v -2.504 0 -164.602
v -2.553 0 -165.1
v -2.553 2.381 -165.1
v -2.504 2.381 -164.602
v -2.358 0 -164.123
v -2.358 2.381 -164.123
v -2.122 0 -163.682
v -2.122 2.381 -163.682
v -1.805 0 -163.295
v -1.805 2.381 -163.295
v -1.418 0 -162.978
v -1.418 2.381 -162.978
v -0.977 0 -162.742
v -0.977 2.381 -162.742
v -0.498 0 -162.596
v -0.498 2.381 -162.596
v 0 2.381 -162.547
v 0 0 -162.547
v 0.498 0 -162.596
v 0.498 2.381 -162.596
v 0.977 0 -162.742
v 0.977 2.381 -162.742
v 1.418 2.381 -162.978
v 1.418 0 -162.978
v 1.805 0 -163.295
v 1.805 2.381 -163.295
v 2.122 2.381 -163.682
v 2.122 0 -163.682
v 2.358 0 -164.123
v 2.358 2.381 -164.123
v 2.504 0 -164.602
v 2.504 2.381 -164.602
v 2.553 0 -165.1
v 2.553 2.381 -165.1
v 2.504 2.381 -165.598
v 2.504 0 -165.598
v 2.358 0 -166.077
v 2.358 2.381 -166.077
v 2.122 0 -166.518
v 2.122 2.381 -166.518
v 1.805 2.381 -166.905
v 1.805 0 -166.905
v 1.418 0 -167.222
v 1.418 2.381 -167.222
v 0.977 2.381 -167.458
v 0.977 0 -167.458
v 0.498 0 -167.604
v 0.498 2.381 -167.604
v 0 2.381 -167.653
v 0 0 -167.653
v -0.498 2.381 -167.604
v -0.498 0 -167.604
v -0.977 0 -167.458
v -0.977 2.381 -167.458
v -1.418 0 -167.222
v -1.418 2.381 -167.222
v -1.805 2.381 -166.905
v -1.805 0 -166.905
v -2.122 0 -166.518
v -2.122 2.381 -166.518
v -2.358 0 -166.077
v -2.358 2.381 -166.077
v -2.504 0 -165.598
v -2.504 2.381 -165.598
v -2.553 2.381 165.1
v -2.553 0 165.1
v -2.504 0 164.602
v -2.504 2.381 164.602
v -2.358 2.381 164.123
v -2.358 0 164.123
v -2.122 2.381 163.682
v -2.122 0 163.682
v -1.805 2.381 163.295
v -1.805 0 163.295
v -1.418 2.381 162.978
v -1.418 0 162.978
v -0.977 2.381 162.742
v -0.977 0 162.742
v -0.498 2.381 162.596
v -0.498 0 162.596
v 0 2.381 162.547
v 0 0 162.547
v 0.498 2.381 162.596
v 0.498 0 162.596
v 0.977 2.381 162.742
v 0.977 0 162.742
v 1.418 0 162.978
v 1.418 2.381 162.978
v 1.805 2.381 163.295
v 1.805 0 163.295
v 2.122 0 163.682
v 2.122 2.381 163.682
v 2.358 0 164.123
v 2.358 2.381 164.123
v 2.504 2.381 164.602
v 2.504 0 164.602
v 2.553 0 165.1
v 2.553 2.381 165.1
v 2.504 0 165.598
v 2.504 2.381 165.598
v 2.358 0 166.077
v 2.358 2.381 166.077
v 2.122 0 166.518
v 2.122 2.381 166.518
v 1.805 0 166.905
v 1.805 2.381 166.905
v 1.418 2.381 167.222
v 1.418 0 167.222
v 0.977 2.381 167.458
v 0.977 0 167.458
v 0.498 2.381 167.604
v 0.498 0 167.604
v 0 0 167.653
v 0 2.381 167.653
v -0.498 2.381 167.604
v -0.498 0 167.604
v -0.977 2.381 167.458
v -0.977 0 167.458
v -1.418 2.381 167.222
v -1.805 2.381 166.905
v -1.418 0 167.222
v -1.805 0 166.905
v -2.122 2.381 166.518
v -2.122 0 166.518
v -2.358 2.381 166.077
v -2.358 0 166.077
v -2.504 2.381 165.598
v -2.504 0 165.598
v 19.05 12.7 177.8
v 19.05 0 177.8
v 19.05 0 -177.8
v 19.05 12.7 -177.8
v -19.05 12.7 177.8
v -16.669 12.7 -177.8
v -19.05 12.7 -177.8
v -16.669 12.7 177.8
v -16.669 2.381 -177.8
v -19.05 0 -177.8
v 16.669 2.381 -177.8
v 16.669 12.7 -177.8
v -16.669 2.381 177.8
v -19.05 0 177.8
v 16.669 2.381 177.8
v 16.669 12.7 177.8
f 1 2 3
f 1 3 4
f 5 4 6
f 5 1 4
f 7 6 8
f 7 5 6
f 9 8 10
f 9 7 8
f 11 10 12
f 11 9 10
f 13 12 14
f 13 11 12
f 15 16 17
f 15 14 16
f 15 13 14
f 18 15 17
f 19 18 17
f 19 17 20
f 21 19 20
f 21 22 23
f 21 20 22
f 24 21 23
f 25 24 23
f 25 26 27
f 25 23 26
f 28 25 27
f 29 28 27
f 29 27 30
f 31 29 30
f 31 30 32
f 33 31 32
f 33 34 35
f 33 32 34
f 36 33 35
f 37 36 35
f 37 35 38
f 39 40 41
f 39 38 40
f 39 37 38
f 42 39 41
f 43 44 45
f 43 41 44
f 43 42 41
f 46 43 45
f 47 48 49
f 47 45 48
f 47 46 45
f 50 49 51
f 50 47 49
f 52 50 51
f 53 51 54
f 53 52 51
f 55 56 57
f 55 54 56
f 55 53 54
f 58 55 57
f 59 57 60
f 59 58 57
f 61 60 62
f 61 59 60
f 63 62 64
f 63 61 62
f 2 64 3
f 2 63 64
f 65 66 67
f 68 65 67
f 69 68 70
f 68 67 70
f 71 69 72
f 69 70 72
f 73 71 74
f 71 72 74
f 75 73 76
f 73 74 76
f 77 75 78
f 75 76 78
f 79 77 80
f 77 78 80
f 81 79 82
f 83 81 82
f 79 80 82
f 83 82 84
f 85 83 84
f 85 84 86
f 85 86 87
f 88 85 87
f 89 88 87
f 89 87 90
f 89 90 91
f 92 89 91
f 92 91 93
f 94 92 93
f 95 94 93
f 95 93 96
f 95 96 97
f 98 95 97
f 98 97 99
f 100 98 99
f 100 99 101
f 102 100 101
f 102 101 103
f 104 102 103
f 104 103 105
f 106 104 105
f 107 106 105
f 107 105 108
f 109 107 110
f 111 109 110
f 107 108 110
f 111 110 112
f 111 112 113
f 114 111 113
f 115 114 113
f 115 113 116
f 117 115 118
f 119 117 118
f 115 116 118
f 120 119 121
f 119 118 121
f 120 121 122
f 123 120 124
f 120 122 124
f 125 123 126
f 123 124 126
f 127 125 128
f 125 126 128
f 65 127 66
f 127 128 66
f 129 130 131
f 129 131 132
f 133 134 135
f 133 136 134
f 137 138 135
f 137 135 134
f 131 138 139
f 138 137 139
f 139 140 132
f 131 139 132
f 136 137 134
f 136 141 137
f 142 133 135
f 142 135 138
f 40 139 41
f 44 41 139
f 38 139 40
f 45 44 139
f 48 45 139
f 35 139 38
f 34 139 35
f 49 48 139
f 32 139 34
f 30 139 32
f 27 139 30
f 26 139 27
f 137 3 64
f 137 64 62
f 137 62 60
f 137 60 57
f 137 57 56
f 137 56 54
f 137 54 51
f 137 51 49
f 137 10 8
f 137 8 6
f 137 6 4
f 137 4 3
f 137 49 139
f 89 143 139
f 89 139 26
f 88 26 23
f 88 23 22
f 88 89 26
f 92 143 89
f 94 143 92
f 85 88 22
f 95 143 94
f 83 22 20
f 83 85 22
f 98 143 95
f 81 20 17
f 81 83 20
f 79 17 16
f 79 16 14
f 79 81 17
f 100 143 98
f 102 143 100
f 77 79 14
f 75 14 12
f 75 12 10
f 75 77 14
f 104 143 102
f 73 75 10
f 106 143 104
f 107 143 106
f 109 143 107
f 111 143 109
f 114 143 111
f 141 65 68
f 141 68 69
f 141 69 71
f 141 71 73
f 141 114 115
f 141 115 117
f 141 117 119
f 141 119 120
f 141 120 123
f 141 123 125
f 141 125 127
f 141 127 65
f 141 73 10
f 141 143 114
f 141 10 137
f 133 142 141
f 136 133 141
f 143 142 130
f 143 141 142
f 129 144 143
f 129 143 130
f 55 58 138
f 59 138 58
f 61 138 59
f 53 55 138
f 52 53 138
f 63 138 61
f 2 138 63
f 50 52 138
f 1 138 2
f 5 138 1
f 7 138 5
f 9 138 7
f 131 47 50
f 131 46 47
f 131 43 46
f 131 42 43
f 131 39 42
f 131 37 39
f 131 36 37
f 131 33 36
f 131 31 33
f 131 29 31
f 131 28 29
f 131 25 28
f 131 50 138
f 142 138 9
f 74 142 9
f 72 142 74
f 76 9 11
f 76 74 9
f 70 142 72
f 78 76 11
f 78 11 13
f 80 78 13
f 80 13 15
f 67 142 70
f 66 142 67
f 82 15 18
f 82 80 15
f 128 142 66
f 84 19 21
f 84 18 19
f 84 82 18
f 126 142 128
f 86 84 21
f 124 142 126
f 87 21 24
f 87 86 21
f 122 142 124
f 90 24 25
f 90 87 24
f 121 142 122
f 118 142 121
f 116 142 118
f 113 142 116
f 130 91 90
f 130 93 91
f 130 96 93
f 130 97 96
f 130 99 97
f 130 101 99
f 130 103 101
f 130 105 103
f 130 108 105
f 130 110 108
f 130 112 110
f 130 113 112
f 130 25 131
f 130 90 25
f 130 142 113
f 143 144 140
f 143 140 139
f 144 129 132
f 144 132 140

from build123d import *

# Parameters (mm, degrees)
BOSS_EXTRUDE1_DEPTH     = 177.8
F_1_4_20_TAPPED_HOLE1_D = 5.1054


with BuildPart() as part:
    # Sketch2 → Boss-Extrude1 (new, symmetric)
    with BuildSketch(Plane.XY):
        Polygon((-16.66875, 12.7), (-19.05, 12.7), (-19.05, 0), (19.05, 0), (19.05, 12.7), (16.66875, 12.7), (16.66875, 2.38125), (-16.66875, 2.38125), align=None)
    extrude(amount=BOSS_EXTRUDE1_DEPTH, both=True)

    # 1/4-20 Tapped Hole1 (through all)
    with Locations(Plane(origin=(0, 2.38125, 0), x_dir=(1, 0, 0), z_dir=(0, 1, 0))):
        with Locations((0, -165.1)):
            f_1_4_20_tapped_hole1 = Hole(F_1_4_20_TAPPED_HOLE1_D / 2)

    # Mirror1: 1/4-20 Tapped Hole1 across plane
    add(f_1_4_20_tapped_hole1.mirror(Plane.XY), mode=Mode.SUBTRACT)


solid = part.part
